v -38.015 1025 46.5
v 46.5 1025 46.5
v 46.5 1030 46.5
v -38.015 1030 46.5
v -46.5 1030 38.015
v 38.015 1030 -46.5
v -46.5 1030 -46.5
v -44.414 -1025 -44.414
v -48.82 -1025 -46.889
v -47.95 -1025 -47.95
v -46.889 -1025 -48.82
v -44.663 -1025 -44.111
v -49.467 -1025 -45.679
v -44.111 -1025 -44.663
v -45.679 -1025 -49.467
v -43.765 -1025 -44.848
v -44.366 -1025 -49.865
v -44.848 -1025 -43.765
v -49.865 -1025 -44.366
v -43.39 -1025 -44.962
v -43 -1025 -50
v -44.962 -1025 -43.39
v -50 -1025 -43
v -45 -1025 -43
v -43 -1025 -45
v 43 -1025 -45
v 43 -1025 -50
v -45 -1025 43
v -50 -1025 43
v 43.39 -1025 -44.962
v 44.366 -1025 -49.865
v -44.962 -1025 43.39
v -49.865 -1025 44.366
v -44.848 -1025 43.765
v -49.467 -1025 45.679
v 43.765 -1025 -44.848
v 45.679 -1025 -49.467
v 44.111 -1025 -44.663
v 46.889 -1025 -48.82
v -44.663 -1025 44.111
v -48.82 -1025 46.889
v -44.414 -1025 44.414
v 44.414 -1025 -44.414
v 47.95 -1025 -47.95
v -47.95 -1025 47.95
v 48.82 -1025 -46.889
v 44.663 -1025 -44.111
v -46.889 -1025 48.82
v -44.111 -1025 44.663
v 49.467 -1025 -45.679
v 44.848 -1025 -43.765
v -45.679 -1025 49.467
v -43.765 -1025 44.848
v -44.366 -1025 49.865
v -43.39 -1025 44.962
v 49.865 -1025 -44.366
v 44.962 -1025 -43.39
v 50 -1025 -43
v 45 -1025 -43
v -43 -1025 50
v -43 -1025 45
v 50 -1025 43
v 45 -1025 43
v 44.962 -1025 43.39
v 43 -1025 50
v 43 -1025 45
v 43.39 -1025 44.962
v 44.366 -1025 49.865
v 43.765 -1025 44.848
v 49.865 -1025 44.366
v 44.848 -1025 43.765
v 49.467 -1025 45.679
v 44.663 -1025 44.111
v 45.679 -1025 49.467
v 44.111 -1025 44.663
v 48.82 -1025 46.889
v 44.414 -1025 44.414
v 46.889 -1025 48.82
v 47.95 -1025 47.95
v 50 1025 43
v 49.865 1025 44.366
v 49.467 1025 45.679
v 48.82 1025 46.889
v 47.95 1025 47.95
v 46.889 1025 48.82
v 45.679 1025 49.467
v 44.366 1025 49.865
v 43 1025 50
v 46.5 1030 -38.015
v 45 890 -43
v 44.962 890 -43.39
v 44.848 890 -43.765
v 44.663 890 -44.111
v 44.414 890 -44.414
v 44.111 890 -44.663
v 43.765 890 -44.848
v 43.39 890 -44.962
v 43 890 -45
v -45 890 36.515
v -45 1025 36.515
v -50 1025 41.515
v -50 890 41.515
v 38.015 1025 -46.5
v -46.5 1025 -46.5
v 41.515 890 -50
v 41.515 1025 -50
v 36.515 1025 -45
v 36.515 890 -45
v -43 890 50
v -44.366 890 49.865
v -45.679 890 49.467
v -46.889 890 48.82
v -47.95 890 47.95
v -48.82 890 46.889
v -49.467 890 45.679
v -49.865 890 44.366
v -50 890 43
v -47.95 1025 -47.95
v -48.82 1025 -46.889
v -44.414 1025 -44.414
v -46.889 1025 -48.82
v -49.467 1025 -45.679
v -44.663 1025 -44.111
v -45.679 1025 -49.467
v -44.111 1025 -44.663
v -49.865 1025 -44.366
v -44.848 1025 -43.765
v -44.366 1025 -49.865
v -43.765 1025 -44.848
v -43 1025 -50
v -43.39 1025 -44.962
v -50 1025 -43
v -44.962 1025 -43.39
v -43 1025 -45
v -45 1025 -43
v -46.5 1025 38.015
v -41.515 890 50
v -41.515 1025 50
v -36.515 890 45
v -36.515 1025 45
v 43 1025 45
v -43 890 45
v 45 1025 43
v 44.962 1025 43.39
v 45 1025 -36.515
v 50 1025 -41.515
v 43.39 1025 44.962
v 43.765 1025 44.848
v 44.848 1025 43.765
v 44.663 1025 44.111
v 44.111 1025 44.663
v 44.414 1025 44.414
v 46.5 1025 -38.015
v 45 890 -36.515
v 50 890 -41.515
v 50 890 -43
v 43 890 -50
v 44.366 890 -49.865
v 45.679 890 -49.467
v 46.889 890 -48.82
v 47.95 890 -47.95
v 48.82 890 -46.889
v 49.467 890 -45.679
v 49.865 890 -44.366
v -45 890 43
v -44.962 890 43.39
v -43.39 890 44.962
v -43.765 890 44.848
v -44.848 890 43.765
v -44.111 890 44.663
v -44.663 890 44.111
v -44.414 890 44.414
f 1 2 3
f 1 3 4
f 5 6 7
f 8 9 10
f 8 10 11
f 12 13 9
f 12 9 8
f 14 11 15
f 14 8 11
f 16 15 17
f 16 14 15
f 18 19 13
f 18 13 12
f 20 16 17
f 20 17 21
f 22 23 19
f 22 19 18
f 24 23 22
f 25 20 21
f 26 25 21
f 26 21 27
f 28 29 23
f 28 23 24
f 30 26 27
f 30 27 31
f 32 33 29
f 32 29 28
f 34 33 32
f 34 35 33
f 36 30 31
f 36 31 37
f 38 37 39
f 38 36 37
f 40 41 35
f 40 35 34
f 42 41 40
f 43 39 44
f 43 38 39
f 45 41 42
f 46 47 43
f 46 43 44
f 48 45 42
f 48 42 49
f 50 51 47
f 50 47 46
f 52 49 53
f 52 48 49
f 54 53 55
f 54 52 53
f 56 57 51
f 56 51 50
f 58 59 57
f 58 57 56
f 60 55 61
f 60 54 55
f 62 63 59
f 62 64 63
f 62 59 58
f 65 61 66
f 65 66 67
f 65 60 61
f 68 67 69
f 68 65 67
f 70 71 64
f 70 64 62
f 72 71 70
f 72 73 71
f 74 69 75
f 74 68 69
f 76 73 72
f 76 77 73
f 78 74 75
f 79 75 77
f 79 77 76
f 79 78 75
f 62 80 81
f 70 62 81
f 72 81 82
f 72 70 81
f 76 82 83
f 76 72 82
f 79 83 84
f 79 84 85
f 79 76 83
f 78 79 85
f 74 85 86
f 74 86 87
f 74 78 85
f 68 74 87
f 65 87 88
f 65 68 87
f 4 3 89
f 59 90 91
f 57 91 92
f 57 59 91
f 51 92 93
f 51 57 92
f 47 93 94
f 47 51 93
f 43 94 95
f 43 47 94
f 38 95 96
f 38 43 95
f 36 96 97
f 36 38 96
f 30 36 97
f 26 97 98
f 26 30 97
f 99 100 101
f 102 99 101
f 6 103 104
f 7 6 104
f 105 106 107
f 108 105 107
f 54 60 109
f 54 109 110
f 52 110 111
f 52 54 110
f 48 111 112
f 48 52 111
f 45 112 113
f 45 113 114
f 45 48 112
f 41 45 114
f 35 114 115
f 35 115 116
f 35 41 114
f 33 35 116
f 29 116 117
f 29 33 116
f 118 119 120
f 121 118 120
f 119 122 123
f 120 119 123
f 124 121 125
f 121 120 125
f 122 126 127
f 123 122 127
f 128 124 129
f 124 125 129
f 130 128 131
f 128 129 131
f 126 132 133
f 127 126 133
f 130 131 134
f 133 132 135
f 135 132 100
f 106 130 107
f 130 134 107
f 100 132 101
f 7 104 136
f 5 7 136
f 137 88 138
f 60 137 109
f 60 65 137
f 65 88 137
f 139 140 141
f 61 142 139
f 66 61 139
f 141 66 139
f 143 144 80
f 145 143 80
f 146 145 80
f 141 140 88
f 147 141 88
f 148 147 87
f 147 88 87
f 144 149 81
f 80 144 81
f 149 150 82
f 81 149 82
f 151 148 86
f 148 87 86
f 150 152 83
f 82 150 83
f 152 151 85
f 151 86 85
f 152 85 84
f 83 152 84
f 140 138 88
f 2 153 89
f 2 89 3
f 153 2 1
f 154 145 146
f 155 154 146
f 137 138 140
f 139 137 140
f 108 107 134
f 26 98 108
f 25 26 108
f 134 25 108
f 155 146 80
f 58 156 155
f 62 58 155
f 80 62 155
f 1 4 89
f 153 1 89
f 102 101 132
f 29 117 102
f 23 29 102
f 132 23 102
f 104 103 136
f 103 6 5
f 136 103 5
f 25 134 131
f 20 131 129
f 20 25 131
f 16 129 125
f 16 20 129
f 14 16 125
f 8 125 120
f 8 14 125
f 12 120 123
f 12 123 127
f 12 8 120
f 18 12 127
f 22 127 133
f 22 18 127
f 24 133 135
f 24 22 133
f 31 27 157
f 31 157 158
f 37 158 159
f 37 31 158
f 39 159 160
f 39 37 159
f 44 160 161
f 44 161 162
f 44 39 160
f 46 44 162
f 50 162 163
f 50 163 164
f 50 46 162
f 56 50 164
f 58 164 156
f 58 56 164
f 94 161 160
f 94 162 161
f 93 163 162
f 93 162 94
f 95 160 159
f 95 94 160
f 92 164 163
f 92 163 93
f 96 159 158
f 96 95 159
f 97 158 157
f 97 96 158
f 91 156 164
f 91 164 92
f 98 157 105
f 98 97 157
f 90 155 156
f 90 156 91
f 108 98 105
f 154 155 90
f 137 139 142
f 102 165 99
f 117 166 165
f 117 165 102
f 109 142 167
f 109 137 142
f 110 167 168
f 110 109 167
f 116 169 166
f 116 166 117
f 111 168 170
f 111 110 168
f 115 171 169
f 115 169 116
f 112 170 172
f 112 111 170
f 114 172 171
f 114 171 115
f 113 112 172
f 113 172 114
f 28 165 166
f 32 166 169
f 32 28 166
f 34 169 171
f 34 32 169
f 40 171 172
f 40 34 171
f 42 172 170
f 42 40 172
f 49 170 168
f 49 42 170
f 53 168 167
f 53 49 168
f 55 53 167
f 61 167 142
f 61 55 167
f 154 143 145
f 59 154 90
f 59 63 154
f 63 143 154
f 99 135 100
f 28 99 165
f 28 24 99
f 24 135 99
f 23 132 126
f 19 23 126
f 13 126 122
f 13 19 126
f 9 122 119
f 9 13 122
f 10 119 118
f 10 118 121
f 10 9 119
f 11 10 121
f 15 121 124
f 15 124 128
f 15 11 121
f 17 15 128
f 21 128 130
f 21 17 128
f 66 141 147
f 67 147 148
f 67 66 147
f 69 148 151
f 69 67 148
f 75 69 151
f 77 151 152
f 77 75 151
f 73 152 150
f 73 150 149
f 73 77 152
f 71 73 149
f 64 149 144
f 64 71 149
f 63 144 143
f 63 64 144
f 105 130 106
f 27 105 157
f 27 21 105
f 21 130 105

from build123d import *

# Parameters (mm, degrees)
F1_DEPTH = 1025
F2_W     = 93
F2_H     = 93
F3_DEPTH = 5
F5_DEPTH = 135


with BuildPart() as f1:
    # F0 (on Front) → F1 (new body, symmetric)
    with BuildSketch(Plane.XZ):
        with BuildLine():
            ThreePointArc((50, 43), (47.9497474683, 47.9497474683), (43, 50))
            Line((43, 50), (-43, 50))
            ThreePointArc((-43, 50), (-47.9497474683, 47.9497474683), (-50, 43))
            Line((-50, 43), (-50, -43))
            ThreePointArc((-50, -43), (-47.9497474683, -47.9497474683), (-43, -50))
            Line((-43, -50), (43, -50))
            ThreePointArc((43, -50), (47.9497474683, -47.9497474683), (50, -43))
            Line((50, -43), (50, 43))
        make_face()
        with BuildLine():
            ThreePointArc((45, -43), (44.4142135624, -44.4142135624), (43, -45))
            Line((43, -45), (-43, -45))
            ThreePointArc((-43, -45), (-44.4142135624, -44.4142135624), (-45, -43))
            Line((-45, -43), (-45, 43))
            ThreePointArc((-45, 43), (-44.4142135624, 44.4142135624), (-43, 45))
            Line((-43, 45), (43, 45))
            ThreePointArc((43, 45), (44.4142135624, 44.4142135624), (45, 43))
            Line((45, 43), (45, -43))
        make_face(mode=Mode.SUBTRACT)
    extrude(amount=F1_DEPTH, both=True)


with BuildPart() as f3:
    # F2 (on face) → F3 (new body)
    with BuildSketch(Plane(origin=(0, 1025, 0), x_dir=(-1, 0, 0), z_dir=(0, 1, 0))):
        Rectangle(F2_W, F2_H)
    extrude(amount=F3_DEPTH)


with BuildPart() as f5_tool:
    # F4 (on face) → F5 (new body, symmetric)
    with BuildSketch(Plane(origin=(0, 1025, 0), x_dir=(-1, 0, 0), z_dir=(0, 1, 0))):
        Polygon((-48.7903679019, -57.2756492761), (57.2756492761, 48.7903679019), (48.7903679019, 57.2756492761), (-57.2756492761, -48.7903679019), align=None)
    extrude(amount=F5_DEPTH, both=True)


with BuildPart() as f1_1:
    add(f1.part)

    # F5: cut by f5_tool
    add(f5_tool.part, mode=Mode.SUBTRACT)


with BuildPart() as f3_1:
    add(f3.part)

    # F5: cut by f5_tool
    add(f5_tool.part, mode=Mode.SUBTRACT)


solid = Compound([f1_1.part, f3_1.part])
